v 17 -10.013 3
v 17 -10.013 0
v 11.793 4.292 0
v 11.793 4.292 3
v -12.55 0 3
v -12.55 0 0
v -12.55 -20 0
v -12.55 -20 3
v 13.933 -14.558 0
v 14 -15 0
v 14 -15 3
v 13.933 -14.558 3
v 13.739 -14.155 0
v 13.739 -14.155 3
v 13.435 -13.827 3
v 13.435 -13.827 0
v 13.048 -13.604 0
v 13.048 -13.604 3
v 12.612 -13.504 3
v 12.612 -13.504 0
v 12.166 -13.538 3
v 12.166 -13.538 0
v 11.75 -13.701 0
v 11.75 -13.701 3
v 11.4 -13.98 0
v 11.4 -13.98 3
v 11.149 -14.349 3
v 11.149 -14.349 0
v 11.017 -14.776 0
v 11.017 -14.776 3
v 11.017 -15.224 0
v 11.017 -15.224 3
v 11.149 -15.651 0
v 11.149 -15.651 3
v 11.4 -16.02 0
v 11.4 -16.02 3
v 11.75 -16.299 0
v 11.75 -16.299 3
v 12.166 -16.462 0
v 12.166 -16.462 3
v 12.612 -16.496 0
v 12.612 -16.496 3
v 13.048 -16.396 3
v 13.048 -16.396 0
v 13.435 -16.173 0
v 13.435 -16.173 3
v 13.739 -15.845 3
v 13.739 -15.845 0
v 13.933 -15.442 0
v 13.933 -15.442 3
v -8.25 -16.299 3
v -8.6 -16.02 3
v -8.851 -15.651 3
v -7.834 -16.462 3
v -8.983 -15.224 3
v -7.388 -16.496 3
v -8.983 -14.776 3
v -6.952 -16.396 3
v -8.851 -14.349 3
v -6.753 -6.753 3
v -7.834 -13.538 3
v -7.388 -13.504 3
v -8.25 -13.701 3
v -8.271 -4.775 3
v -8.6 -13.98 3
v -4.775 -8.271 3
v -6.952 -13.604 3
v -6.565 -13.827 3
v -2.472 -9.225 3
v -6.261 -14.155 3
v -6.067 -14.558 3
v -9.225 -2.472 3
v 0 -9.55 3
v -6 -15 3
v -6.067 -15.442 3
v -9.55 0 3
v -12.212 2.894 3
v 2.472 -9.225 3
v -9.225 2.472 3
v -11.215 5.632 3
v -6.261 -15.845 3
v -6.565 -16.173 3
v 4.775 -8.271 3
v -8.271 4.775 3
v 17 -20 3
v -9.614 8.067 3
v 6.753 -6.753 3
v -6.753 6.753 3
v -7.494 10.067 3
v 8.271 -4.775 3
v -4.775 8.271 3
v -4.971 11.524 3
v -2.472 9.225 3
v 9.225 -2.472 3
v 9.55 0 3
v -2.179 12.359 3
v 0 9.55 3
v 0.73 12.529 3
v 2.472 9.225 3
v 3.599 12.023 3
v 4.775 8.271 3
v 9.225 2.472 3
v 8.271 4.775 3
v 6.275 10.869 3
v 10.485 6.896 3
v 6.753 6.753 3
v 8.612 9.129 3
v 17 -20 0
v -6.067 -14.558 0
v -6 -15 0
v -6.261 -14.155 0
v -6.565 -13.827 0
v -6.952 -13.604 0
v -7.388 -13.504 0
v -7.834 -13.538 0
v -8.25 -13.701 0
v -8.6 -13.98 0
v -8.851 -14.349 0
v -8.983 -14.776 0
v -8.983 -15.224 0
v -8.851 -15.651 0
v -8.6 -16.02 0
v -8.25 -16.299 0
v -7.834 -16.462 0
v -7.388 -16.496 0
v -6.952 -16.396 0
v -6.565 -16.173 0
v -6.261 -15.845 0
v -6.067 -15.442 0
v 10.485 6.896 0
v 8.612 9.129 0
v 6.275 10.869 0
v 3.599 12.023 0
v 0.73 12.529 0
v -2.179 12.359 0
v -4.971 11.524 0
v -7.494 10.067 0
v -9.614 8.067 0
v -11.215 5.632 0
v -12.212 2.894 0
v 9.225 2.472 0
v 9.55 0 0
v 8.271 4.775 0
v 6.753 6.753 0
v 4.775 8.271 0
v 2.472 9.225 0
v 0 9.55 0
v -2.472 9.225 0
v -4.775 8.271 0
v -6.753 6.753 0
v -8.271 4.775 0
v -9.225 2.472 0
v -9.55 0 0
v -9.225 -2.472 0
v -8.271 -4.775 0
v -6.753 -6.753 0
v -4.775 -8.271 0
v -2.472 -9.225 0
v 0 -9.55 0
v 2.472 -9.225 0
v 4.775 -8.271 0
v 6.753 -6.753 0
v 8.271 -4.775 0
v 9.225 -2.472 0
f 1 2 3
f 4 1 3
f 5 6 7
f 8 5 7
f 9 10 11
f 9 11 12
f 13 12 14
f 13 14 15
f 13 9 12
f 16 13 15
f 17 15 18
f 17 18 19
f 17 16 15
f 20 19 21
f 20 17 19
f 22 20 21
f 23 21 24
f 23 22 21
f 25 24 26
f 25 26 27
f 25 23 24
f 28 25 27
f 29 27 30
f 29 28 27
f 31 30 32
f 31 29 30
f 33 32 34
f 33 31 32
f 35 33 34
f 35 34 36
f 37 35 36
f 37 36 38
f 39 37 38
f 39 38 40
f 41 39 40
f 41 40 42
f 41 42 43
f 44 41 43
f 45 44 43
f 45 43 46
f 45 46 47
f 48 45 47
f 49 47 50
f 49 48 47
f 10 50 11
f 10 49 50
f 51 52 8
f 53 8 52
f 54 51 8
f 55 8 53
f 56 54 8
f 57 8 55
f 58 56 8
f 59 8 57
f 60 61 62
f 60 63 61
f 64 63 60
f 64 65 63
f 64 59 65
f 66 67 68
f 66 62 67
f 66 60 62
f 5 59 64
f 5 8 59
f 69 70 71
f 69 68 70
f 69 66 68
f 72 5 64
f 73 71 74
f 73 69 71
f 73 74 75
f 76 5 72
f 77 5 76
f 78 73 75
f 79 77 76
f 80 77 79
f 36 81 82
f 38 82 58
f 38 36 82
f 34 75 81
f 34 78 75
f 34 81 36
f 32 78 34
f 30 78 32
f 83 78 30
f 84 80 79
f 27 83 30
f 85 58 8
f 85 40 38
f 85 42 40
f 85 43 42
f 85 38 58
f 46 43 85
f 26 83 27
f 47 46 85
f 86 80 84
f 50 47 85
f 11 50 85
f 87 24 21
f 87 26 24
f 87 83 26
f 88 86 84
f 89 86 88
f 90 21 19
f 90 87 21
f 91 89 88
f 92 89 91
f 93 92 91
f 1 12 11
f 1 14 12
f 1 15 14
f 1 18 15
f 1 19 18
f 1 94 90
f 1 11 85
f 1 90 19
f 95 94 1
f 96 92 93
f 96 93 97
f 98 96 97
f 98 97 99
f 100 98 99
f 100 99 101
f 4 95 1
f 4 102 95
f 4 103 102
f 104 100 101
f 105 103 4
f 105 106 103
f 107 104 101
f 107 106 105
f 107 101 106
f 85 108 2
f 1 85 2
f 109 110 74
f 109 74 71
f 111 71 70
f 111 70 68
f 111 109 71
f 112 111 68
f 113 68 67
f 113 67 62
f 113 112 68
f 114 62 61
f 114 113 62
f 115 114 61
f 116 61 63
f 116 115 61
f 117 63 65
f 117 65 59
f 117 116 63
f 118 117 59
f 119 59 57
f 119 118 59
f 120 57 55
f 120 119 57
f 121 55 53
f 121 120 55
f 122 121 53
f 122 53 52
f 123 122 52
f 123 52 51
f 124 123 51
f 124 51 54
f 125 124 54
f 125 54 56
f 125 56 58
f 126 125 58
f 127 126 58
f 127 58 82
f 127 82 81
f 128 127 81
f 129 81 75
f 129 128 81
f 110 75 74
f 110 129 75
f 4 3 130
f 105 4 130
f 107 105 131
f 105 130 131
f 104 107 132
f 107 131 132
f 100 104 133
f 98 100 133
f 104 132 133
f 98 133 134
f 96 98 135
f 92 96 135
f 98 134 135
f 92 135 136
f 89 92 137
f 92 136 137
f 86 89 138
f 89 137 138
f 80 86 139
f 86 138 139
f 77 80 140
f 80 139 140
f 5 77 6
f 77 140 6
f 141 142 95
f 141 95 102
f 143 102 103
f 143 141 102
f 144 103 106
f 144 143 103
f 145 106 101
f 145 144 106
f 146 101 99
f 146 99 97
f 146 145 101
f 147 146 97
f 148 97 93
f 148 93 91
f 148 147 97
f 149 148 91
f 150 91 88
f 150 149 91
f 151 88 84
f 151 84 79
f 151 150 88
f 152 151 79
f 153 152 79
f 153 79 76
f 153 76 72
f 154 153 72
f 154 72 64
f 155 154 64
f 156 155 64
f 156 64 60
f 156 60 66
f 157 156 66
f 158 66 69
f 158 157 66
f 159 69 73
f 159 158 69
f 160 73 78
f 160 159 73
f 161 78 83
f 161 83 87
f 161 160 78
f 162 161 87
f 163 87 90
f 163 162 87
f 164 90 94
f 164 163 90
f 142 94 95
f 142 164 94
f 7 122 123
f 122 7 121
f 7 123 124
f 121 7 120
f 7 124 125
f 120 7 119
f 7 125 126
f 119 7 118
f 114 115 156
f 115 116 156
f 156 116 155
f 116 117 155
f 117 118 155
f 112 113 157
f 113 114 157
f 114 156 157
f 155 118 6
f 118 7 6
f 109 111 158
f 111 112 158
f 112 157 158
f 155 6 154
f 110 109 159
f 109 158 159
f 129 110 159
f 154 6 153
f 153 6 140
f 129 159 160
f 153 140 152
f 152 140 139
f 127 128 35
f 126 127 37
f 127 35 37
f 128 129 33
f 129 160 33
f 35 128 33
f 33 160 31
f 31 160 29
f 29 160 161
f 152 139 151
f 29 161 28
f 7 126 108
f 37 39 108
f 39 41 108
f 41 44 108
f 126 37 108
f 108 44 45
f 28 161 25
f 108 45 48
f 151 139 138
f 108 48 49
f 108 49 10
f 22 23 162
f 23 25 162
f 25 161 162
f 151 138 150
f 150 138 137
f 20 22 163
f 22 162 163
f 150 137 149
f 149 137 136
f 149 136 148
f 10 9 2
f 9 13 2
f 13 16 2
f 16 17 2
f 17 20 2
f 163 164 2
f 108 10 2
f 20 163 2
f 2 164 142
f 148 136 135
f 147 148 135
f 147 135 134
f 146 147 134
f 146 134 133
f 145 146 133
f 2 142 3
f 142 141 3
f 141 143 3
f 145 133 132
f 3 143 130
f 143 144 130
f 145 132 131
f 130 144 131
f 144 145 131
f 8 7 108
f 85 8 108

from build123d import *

# Parameters (mm, degrees)
SKETCH_1_R      = 9.55
SKETCH_1_R_2    = 1.5
EXTRUDE_1_DEPTH = 3


with BuildPart() as part:
    # 草图1 → 凸台-拉伸1 (new body)
    with BuildSketch(Plane.XY):
        with BuildLine():
            Line((-12.55, -20), (17, -20))
            Line((17, -20), (17, -10.013370909))
            Line((17, -10.013370909), (11.793142391, 4.292352799))
            ThreePointArc((11.793142391, 4.292352799), (-2.17928463, 12.3593373), (-12.55, 0))
            Line((-12.55, 0), (-12.55, -20))
        make_face()
        Circle(SKETCH_1_R, mode=Mode.SUBTRACT)
        with Locations((-7.5, -15)):
            Circle(SKETCH_1_R_2, mode=Mode.SUBTRACT)
        with Locations((12.5, -15)):
            Circle(SKETCH_1_R_2, mode=Mode.SUBTRACT)
    extrude(amount=EXTRUDE_1_DEPTH)


solid = part.part
